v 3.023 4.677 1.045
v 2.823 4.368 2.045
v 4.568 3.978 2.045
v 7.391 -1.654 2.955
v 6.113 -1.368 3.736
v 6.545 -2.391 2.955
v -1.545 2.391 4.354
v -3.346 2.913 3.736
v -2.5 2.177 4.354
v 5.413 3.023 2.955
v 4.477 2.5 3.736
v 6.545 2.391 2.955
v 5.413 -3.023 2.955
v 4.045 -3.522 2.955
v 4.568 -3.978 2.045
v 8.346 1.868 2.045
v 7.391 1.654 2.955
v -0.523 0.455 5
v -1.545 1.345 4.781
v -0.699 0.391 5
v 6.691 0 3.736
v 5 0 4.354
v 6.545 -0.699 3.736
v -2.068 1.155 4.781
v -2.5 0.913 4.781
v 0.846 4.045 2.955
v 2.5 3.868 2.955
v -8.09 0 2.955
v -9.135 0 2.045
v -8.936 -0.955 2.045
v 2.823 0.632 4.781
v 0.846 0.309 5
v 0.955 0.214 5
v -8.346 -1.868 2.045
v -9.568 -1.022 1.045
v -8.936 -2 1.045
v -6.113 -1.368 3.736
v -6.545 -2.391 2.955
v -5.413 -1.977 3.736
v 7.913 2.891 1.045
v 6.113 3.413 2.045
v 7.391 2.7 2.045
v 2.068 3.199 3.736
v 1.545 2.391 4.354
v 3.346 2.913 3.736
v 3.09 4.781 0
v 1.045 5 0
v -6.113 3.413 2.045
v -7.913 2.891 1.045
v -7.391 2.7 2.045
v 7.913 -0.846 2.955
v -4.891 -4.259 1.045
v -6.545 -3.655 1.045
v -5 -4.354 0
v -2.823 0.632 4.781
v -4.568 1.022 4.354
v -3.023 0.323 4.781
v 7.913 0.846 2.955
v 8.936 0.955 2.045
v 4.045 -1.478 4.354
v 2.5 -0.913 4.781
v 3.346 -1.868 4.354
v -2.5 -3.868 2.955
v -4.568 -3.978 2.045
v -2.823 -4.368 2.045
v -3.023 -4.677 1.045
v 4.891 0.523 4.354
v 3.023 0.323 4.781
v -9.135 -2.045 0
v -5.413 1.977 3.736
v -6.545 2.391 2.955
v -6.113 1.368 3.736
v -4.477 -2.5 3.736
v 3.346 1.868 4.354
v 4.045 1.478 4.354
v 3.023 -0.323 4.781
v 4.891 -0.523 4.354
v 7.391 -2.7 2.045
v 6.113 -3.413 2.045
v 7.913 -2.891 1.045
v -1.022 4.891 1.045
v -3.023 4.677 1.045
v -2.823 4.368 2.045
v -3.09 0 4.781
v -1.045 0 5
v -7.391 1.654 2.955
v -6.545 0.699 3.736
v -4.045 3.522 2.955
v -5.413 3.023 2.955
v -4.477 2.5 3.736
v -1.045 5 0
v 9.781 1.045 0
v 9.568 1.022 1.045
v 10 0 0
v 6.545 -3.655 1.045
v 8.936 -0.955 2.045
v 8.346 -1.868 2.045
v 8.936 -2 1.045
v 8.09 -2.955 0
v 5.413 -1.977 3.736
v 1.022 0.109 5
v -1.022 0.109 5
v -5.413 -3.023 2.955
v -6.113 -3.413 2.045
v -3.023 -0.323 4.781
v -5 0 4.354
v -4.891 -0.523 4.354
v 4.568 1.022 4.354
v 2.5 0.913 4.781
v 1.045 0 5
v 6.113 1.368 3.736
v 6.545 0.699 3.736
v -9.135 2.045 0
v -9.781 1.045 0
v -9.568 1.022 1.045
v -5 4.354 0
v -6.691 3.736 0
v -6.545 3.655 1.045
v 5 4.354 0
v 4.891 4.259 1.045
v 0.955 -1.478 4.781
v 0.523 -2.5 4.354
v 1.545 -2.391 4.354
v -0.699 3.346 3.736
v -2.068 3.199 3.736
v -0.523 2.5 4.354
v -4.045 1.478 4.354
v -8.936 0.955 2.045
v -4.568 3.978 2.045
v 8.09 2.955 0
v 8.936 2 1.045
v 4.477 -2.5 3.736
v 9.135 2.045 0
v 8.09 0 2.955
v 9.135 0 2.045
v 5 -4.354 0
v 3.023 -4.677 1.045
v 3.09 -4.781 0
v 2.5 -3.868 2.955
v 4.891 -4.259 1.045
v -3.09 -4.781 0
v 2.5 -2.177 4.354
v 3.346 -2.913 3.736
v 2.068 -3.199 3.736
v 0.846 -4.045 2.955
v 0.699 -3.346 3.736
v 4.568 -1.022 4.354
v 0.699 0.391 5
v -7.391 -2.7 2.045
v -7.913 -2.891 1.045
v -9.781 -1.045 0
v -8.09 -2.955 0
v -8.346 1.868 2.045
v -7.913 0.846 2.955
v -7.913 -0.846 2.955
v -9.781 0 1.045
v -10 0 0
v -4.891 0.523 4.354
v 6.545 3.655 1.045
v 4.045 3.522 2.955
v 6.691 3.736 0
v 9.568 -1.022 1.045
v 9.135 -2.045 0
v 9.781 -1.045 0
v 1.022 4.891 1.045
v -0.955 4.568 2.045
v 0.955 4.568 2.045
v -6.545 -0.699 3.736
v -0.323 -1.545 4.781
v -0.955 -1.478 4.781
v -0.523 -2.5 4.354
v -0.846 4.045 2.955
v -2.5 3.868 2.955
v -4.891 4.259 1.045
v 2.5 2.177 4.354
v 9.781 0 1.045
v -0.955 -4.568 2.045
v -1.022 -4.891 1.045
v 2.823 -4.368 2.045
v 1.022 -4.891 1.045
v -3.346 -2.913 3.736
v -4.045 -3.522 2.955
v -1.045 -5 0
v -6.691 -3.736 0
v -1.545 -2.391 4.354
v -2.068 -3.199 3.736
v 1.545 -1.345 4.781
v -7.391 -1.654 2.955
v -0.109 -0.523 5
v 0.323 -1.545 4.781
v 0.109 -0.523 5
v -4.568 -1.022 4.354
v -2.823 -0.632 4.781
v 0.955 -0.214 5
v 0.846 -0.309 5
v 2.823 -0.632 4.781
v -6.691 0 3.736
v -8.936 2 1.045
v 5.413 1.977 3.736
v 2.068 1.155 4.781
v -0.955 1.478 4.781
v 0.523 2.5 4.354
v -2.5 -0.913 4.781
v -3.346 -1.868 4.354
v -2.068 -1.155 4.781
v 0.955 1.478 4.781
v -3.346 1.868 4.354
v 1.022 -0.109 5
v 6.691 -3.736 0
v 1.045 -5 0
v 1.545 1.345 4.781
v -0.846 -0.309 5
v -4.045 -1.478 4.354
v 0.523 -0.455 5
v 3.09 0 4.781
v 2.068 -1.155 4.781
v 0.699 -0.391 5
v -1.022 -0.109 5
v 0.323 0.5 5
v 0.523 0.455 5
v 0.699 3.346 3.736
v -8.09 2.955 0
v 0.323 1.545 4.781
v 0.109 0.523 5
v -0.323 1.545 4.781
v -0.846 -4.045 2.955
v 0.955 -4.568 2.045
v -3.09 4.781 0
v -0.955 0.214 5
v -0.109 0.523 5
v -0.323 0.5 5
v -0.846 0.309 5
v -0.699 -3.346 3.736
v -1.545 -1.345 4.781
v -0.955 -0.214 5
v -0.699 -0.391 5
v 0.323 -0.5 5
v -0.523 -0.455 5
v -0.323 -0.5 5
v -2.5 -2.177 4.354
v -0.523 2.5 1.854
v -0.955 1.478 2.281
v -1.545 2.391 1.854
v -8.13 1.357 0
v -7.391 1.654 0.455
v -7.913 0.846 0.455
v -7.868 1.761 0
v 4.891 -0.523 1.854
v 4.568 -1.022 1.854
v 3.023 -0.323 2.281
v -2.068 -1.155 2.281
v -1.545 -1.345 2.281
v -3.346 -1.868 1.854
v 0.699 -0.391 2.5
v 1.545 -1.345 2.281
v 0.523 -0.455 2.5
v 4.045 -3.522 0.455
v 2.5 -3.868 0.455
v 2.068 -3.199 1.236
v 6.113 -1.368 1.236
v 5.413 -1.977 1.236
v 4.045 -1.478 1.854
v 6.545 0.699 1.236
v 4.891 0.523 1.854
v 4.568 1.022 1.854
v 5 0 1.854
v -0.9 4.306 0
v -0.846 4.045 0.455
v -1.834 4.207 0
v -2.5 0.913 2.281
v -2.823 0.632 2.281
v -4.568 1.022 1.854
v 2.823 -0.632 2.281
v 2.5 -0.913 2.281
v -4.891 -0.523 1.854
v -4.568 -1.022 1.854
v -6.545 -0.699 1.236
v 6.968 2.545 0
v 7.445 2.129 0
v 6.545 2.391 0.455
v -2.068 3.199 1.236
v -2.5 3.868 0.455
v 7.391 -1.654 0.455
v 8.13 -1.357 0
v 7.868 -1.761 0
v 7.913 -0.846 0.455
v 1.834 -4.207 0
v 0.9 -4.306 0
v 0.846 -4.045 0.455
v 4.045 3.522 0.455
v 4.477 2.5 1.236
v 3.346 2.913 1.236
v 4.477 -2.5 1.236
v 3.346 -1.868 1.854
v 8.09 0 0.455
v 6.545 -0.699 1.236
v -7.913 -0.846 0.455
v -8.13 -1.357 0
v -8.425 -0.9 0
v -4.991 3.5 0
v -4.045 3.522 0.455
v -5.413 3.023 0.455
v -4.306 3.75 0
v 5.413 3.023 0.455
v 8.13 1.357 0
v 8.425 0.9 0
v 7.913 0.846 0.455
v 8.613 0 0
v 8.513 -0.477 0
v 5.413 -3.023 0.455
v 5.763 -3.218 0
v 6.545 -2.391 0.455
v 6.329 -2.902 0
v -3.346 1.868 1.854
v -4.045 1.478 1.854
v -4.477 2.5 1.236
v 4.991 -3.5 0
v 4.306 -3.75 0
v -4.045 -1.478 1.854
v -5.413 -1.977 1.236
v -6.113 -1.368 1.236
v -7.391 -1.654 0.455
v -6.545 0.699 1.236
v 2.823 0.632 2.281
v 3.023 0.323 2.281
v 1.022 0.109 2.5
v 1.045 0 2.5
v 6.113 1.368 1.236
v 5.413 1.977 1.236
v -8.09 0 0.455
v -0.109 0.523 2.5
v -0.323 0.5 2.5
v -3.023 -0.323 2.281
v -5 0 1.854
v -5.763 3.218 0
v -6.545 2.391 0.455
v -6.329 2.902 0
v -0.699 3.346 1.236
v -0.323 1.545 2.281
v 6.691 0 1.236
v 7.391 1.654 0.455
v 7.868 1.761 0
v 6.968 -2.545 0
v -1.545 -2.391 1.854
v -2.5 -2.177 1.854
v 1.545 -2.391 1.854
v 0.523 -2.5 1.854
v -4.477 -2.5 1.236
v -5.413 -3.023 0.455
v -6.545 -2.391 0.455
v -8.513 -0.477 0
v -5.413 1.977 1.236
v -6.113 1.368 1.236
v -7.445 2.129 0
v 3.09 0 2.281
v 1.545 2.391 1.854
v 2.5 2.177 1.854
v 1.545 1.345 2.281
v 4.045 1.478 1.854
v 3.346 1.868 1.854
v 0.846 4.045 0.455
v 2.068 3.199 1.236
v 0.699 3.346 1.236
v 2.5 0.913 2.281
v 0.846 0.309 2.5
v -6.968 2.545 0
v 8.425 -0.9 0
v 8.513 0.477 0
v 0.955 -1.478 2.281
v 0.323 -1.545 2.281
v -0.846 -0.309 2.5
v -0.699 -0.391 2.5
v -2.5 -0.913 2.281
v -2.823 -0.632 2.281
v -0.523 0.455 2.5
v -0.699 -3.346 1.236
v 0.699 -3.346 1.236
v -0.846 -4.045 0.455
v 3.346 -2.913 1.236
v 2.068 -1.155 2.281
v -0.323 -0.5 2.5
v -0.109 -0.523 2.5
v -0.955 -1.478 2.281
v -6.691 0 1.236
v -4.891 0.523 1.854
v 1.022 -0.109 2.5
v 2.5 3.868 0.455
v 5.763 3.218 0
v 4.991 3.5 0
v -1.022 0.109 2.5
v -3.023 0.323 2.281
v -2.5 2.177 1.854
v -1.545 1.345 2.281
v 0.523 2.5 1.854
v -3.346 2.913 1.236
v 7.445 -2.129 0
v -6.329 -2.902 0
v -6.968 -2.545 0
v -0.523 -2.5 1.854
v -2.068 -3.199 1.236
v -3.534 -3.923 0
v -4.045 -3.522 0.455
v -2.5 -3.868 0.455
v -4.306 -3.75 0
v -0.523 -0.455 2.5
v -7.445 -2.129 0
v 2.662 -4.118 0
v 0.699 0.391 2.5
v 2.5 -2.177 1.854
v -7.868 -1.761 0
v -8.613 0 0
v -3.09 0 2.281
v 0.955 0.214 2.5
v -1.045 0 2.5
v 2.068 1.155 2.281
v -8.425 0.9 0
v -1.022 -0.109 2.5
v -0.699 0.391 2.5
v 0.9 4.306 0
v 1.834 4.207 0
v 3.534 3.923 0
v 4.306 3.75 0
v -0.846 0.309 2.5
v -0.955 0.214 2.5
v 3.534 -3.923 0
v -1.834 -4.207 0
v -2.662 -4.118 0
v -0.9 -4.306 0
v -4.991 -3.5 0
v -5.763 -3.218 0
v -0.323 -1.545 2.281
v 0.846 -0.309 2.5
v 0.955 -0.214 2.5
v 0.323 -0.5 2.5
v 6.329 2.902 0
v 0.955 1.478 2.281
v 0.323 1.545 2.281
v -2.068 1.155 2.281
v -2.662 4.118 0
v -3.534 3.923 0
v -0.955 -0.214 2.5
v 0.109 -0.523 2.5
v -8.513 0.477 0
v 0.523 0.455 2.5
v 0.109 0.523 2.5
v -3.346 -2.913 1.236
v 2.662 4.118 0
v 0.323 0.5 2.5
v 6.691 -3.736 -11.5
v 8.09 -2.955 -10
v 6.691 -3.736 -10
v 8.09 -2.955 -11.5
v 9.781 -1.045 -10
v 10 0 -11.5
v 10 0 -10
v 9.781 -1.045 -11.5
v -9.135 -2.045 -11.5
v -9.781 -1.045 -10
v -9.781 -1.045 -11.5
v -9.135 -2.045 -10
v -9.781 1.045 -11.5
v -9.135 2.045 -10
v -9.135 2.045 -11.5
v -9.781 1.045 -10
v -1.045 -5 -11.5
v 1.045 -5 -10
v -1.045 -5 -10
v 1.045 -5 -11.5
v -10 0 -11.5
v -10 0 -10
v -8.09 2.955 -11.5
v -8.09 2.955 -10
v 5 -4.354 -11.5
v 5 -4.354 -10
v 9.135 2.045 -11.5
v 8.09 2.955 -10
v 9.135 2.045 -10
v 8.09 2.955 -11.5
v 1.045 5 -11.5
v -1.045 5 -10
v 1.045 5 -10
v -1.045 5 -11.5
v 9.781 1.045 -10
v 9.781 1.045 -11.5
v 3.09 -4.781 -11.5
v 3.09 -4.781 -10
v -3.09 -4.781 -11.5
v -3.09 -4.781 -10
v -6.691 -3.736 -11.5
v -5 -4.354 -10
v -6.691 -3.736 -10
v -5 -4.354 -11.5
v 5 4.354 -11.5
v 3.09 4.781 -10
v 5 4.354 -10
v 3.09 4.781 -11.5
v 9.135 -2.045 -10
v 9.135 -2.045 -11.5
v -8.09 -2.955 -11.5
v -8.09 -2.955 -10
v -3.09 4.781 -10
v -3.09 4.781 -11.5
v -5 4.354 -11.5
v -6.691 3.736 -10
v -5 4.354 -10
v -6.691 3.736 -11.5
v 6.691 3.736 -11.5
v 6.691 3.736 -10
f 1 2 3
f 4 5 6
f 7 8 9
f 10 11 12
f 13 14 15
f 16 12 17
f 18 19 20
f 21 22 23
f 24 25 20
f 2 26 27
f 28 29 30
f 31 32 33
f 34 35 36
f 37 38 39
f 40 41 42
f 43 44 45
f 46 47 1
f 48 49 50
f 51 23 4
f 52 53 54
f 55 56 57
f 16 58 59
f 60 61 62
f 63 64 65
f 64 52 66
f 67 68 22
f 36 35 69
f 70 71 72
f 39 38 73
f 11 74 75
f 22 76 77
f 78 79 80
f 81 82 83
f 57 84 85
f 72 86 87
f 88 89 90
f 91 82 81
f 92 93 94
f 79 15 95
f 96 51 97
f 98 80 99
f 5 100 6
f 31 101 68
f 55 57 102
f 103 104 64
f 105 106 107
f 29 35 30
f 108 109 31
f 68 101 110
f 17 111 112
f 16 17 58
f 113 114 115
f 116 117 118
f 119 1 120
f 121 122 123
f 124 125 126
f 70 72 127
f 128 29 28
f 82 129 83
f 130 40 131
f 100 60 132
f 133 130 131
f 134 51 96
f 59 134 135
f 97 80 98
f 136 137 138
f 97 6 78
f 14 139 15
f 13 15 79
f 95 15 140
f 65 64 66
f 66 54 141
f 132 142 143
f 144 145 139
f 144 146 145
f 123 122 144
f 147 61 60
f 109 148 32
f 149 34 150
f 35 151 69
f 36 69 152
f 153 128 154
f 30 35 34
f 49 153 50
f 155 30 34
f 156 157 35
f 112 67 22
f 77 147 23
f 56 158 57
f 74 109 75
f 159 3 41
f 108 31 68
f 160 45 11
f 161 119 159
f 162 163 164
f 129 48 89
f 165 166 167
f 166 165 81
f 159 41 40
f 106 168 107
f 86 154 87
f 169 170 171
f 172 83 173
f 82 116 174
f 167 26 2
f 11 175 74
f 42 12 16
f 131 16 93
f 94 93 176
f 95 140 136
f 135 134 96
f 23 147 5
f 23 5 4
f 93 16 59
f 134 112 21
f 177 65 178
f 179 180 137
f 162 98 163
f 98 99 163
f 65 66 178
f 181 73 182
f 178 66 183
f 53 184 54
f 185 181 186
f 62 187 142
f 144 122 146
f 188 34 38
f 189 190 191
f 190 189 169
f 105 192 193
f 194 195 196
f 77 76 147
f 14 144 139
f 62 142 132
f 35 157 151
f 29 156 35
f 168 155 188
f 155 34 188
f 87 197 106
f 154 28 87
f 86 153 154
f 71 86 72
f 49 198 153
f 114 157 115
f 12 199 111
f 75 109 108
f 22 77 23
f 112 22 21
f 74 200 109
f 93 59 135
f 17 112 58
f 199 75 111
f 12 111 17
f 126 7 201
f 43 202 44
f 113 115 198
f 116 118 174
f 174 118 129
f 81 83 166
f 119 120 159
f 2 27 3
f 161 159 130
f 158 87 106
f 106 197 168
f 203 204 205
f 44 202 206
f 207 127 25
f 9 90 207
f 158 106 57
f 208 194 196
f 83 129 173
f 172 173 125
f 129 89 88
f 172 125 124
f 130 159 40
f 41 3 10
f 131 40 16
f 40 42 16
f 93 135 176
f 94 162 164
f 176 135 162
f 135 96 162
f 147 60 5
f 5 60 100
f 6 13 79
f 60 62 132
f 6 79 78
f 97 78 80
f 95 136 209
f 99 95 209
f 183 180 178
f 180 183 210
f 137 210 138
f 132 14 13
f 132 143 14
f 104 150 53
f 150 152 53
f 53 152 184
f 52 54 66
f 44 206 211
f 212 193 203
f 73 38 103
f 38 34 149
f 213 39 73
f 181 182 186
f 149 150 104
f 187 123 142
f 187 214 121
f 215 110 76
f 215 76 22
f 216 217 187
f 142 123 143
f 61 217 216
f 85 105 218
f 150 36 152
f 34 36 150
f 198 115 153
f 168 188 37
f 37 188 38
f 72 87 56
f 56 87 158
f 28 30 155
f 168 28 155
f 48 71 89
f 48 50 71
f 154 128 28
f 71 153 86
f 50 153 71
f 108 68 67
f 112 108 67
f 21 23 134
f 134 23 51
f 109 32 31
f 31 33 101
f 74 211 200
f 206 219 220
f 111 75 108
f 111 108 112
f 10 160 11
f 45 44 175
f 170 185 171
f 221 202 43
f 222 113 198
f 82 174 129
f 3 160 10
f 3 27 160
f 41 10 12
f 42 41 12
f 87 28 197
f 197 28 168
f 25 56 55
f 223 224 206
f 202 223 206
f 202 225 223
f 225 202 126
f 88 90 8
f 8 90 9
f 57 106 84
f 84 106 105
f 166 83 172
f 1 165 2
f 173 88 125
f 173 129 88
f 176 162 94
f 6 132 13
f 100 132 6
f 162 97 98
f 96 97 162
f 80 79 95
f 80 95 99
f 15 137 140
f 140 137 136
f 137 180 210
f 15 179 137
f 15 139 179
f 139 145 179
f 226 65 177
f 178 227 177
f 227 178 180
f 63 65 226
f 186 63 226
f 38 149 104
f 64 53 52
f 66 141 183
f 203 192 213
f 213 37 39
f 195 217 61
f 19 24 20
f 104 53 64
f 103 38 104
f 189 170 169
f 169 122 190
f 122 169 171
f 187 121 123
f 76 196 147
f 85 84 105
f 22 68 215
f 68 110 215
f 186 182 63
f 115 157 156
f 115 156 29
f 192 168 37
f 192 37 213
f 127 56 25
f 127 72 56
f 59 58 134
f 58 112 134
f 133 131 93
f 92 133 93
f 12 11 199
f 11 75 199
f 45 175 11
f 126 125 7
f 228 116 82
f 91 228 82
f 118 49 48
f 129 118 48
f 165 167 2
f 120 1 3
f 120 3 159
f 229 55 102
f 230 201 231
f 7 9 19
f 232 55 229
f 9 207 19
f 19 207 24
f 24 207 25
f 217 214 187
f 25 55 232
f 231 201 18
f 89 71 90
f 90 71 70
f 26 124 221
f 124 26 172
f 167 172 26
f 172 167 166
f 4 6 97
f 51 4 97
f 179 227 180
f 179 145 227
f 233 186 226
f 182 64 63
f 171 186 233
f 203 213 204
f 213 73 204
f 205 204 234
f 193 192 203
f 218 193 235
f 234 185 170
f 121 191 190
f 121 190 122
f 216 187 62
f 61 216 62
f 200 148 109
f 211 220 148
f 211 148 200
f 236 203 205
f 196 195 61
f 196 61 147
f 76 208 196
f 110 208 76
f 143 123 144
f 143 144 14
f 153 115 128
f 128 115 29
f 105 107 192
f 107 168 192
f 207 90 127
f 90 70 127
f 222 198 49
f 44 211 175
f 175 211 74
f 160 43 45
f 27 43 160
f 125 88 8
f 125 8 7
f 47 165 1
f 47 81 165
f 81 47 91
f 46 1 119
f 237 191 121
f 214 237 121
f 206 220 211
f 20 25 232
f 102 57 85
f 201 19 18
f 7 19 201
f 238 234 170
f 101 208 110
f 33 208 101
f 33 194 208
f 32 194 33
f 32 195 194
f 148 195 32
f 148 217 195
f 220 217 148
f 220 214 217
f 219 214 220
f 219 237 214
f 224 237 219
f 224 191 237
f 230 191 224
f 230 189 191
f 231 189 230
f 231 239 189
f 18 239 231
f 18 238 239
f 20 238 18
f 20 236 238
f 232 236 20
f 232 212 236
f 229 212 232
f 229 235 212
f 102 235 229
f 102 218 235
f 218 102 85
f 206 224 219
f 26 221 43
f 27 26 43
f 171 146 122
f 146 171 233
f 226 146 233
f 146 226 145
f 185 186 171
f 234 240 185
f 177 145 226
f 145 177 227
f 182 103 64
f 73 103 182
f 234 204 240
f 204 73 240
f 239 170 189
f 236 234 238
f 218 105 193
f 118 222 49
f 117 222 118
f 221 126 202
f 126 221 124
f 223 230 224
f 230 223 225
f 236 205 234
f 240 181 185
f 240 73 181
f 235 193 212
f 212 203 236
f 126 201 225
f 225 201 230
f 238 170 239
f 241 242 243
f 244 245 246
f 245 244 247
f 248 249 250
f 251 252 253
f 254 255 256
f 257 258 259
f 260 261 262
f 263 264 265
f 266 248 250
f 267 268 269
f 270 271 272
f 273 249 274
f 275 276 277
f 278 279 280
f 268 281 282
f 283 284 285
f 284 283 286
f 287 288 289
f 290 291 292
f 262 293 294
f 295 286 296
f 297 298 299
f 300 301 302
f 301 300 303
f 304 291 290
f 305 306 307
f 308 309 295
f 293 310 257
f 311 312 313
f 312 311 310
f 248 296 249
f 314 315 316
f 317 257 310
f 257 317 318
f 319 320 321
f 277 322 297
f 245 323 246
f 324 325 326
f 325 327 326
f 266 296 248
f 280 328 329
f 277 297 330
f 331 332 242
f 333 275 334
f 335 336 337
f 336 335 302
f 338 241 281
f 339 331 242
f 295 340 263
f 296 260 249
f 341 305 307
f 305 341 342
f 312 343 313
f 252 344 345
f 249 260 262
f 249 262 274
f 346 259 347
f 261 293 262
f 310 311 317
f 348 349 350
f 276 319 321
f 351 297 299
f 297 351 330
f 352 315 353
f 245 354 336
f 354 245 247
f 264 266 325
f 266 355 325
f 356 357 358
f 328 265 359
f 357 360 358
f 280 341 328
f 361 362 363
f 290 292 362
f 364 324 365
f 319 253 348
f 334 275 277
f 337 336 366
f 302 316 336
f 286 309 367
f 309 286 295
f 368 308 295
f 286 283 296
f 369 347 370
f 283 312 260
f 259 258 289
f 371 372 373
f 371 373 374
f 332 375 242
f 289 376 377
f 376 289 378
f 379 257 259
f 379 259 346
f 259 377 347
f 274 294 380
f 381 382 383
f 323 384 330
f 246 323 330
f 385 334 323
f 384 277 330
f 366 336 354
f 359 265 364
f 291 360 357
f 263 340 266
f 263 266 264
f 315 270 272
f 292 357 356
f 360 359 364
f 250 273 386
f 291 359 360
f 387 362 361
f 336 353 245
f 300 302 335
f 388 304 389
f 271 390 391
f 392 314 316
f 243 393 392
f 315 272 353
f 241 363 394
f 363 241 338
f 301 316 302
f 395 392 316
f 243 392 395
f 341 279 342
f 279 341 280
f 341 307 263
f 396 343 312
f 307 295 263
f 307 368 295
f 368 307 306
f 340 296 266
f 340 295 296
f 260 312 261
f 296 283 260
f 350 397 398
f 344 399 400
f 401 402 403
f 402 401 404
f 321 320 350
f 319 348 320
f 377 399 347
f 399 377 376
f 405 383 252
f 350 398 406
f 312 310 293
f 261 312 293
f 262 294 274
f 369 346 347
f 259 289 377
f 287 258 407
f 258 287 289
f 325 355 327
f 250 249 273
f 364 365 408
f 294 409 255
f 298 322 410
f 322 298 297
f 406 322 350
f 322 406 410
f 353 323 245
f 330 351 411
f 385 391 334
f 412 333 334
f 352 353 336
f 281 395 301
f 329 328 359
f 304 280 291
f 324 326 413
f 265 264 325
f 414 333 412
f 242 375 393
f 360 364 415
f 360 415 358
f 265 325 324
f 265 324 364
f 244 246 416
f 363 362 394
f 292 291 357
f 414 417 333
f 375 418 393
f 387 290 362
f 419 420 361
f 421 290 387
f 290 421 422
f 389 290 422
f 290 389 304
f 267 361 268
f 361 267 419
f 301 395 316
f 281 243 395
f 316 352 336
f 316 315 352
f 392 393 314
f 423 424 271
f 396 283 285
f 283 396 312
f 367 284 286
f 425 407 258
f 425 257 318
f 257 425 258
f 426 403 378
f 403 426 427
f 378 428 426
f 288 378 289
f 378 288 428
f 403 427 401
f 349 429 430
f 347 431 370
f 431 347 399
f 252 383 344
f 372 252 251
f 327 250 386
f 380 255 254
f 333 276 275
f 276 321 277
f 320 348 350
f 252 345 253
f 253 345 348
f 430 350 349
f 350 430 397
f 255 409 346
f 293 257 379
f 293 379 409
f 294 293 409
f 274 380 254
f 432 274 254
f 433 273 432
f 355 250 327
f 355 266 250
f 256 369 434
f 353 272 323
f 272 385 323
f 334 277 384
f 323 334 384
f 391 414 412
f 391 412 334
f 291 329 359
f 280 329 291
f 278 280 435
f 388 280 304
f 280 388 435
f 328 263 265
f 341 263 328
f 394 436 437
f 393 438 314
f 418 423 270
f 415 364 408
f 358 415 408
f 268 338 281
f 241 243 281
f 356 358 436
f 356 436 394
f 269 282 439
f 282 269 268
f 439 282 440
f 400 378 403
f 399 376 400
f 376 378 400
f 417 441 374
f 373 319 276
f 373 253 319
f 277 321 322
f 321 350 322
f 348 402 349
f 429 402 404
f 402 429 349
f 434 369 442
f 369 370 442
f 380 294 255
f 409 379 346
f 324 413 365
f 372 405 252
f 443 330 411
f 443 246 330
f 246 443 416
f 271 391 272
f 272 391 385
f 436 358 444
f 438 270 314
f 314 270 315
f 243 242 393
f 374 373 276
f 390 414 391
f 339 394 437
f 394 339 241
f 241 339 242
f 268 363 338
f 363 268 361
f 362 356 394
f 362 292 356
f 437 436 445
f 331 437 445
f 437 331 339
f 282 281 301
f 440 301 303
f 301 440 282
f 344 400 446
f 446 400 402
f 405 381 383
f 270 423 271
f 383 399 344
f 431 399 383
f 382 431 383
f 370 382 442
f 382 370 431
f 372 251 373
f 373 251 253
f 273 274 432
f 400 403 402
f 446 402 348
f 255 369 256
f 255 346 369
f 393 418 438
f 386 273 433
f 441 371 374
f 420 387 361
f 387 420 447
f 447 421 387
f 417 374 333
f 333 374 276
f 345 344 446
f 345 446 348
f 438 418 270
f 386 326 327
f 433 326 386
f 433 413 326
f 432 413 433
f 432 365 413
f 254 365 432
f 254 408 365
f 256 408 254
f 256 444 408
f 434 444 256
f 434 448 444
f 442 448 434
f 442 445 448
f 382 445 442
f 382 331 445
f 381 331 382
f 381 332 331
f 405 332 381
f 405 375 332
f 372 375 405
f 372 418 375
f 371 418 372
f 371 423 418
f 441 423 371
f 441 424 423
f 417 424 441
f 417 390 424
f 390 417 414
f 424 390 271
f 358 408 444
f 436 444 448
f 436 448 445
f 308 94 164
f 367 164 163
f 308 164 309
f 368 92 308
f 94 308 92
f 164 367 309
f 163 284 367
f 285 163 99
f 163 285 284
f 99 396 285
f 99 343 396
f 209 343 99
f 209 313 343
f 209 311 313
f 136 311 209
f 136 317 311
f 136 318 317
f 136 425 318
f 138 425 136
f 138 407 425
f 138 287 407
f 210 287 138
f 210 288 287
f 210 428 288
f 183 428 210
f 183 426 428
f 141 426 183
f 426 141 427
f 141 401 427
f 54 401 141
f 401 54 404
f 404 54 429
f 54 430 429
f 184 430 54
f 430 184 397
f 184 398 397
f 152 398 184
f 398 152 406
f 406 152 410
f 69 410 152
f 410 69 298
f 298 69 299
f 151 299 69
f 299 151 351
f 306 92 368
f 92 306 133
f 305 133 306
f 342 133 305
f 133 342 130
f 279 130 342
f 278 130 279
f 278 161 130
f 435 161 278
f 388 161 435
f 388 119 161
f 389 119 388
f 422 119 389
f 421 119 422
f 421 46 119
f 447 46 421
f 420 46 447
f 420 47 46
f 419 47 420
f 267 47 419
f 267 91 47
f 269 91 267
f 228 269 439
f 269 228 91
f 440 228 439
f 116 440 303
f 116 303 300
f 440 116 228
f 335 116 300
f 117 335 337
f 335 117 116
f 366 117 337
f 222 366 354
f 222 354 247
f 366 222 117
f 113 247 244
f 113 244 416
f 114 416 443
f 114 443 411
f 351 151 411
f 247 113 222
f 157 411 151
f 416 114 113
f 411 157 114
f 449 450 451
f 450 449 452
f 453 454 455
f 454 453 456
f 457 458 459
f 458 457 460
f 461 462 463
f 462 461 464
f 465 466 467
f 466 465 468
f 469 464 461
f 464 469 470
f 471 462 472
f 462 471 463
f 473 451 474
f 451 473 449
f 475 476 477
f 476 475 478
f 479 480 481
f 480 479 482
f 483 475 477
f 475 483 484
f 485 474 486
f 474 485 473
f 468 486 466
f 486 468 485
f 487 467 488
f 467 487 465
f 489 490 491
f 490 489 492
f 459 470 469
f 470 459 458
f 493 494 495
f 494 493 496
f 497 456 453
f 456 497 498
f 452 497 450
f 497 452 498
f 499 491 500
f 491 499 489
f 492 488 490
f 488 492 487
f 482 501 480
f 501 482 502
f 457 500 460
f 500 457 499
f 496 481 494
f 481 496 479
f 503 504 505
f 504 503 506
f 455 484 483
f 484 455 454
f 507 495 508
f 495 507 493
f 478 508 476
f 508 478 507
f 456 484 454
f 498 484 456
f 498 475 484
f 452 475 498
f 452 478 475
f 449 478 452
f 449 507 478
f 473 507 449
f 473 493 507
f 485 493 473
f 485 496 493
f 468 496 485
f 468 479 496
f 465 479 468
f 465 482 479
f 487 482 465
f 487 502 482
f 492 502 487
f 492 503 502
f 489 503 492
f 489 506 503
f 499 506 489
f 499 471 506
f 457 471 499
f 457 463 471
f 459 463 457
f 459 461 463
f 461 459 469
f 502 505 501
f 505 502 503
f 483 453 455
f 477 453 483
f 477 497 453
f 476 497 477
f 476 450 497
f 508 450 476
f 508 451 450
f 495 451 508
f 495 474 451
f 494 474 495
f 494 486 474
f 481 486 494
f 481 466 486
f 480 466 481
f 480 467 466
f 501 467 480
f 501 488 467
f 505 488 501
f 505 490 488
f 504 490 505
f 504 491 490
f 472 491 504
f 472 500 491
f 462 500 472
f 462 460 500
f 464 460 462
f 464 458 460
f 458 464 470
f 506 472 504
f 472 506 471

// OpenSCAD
module mySphere (radius, x, y, z) {
    resize([x, y, z])
    sphere(r = radius);
}

module myEllipse(radius, height, x, y, z) {
    linear_extrude(height = height, center = false, convexity = 10)
        resize([x, y, z])
        circle(r = radius);
}


myRadius = 10;
myX = 20;
myY = 10;
myZ = 10;

eHeight = 1.5;

module cap(myRadius, myX, myY, myZ) {
    difference () {
        mySphere(myRadius, myX, myY, myZ);
        translate([0,0,-2.5]) mySphere(myRadius, myX, myY, myZ);
    }
}

module clips(myRadius, eHeight, myX, myY, myZ) {
    translate([0,0, -1.5]) myEllipse(myRadius, eHeight, myX, myY, myZ);    
}

difference () {
    cap(myRadius, myX, myY, myZ);
    translate([0,0, -1.5]) myEllipse(myRadius, eHeight, myX, myY, myZ);    
}

translate([0,0,-10]) clips(myRadius, eHeight, myX, myY, myZ);
